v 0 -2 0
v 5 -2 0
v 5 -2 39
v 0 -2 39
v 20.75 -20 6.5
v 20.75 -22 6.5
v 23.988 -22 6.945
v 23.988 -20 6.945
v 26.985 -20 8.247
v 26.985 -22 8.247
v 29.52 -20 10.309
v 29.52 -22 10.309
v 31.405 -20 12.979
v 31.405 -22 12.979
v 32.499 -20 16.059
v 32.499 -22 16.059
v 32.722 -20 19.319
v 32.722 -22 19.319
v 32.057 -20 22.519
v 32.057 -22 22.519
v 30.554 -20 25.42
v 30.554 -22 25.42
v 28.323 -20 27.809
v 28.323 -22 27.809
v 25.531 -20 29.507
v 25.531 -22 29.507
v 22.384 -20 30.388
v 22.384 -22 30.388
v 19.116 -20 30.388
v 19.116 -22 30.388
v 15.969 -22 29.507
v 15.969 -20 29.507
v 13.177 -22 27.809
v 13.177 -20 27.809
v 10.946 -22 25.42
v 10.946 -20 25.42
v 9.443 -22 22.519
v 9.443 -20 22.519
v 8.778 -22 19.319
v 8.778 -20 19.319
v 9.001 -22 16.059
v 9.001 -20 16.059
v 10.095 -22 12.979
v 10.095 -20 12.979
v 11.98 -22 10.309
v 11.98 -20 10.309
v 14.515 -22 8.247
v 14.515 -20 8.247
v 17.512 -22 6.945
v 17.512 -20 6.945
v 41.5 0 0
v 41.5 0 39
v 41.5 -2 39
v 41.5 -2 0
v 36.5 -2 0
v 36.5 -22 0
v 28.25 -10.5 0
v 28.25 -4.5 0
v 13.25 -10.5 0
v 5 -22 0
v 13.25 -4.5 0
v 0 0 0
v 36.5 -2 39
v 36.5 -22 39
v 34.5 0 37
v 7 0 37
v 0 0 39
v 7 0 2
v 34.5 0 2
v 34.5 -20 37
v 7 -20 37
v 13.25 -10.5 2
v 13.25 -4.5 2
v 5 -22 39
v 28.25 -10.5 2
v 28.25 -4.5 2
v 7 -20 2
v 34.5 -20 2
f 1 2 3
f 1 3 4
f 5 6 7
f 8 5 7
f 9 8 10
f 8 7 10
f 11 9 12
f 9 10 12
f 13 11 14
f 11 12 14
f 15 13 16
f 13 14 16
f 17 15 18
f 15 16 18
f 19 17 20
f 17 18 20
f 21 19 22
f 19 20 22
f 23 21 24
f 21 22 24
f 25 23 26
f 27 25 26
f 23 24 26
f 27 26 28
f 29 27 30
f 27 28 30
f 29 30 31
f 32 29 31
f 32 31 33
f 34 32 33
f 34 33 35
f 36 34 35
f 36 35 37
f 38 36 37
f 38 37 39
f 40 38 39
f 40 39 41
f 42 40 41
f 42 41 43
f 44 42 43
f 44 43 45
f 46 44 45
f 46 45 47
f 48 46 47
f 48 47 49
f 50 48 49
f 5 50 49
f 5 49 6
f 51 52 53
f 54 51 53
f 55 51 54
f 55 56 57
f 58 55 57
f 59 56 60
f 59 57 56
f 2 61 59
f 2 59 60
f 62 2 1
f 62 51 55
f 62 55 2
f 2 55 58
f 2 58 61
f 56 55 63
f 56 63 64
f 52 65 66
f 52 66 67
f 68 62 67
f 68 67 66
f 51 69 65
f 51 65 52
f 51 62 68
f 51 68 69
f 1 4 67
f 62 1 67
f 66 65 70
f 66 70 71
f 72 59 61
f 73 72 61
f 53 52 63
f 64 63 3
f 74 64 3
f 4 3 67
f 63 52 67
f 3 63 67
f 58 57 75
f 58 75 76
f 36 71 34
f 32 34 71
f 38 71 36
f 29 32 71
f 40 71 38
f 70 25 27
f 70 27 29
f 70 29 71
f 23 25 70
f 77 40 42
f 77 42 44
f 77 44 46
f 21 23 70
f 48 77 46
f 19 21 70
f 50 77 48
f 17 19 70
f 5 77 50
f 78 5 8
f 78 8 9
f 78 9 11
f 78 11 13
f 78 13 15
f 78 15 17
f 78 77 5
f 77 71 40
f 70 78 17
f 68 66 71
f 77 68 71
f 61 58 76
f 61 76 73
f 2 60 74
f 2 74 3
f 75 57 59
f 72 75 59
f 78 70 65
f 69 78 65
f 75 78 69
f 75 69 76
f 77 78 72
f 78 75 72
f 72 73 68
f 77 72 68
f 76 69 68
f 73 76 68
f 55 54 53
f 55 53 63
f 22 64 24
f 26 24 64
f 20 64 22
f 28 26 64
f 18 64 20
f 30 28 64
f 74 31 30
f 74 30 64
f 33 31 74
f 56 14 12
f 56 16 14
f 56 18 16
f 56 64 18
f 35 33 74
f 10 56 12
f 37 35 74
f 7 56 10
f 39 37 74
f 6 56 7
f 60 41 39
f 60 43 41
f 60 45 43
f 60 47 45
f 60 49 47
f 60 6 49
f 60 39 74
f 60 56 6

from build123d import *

# Parameters (mm, degrees)
BOSS_EXTRUDE1_DEPTH = 37
BOSS_EXTRUDE2_DEPTH = 2
BOSS_EXTRUDE3_START = -35
BOSS_EXTRUDE3_DEPTH = 2
CUT_EXTRUDE2_DEPTH  = 2
SKETCH8_W           = 15
SKETCH8_H           = 6
SKETCH8_W_2         = 12
SKETCH8_H_2         = 3
CUT_EXTRUDE3_DEPTH  = 10
SKETCH3_R           = 12
CUT_EXTRUDE4_DEPTH  = 10


with BuildPart() as part:
    # Sketch2 → Boss-Extrude1 (new body)
    with BuildSketch(Plane.XY):
        Polygon((0, 0), (7, 0), (7, -20), (34.5, -20), (34.5, 0), (41.5, 0), (41.5, -2), (36.5, -2), (36.5, -22), (5, -22), (5, -2), (0, -2), align=None)
    extrude(amount=BOSS_EXTRUDE1_DEPTH)

    # Sketch5 → Boss-Extrude2 (add)
    with BuildSketch(Plane.XY.offset(37)):
        Polygon((0, 0), (41.5, 0), (41.5, -2), (36.5, -2), (36.5, -22), (5, -22), (5, -2), (0, -2), align=None)
    extrude(amount=BOSS_EXTRUDE2_DEPTH)

    # Sketch5<2> → Boss-Extrude3 (add)
    with BuildSketch(Plane.XY.offset(37).offset(BOSS_EXTRUDE3_START)):
        Polygon((0, 0), (41.5, 0), (41.5, -2), (36.5, -2), (36.5, -22), (5, -22), (5, -2), (0, -2), align=None)
    extrude(amount=-BOSS_EXTRUDE3_DEPTH)

    # Sketch6 → Cut-Extrude2 (cut)
    with BuildSketch(Plane(origin=(0, 0, 0), x_dir=(-1, 0, 0), z_dir=(0, 0, -1))):
        Polygon((-20.75, -9), (-14.75, -9), (-14.75, -6), (-26.75, -6), (-26.75, -9), align=None)
    extrude(amount=-CUT_EXTRUDE2_DEPTH, mode=Mode.SUBTRACT)

    # Sketch8 → Cut-Extrude3 (cut)
    with BuildSketch(Plane(origin=(0, 0, 0), x_dir=(-1, 0, 0), z_dir=(0, 0, -1))):
        with Locations((-20.75, -7.5)):
            Rectangle(SKETCH8_W, SKETCH8_H)
        with Locations((-20.75, -7.5)):
            Rectangle(SKETCH8_W_2, SKETCH8_H_2, mode=Mode.SUBTRACT)
    extrude(amount=-CUT_EXTRUDE3_DEPTH, mode=Mode.SUBTRACT)

    # Sketch3 → Cut-Extrude4 (cut)
    with BuildSketch(Plane.XZ.offset(22)):
        with Locations((20.75, 18.5)):
            Circle(SKETCH3_R)
    extrude(amount=-CUT_EXTRUDE4_DEPTH, mode=Mode.SUBTRACT)


solid = part.part
